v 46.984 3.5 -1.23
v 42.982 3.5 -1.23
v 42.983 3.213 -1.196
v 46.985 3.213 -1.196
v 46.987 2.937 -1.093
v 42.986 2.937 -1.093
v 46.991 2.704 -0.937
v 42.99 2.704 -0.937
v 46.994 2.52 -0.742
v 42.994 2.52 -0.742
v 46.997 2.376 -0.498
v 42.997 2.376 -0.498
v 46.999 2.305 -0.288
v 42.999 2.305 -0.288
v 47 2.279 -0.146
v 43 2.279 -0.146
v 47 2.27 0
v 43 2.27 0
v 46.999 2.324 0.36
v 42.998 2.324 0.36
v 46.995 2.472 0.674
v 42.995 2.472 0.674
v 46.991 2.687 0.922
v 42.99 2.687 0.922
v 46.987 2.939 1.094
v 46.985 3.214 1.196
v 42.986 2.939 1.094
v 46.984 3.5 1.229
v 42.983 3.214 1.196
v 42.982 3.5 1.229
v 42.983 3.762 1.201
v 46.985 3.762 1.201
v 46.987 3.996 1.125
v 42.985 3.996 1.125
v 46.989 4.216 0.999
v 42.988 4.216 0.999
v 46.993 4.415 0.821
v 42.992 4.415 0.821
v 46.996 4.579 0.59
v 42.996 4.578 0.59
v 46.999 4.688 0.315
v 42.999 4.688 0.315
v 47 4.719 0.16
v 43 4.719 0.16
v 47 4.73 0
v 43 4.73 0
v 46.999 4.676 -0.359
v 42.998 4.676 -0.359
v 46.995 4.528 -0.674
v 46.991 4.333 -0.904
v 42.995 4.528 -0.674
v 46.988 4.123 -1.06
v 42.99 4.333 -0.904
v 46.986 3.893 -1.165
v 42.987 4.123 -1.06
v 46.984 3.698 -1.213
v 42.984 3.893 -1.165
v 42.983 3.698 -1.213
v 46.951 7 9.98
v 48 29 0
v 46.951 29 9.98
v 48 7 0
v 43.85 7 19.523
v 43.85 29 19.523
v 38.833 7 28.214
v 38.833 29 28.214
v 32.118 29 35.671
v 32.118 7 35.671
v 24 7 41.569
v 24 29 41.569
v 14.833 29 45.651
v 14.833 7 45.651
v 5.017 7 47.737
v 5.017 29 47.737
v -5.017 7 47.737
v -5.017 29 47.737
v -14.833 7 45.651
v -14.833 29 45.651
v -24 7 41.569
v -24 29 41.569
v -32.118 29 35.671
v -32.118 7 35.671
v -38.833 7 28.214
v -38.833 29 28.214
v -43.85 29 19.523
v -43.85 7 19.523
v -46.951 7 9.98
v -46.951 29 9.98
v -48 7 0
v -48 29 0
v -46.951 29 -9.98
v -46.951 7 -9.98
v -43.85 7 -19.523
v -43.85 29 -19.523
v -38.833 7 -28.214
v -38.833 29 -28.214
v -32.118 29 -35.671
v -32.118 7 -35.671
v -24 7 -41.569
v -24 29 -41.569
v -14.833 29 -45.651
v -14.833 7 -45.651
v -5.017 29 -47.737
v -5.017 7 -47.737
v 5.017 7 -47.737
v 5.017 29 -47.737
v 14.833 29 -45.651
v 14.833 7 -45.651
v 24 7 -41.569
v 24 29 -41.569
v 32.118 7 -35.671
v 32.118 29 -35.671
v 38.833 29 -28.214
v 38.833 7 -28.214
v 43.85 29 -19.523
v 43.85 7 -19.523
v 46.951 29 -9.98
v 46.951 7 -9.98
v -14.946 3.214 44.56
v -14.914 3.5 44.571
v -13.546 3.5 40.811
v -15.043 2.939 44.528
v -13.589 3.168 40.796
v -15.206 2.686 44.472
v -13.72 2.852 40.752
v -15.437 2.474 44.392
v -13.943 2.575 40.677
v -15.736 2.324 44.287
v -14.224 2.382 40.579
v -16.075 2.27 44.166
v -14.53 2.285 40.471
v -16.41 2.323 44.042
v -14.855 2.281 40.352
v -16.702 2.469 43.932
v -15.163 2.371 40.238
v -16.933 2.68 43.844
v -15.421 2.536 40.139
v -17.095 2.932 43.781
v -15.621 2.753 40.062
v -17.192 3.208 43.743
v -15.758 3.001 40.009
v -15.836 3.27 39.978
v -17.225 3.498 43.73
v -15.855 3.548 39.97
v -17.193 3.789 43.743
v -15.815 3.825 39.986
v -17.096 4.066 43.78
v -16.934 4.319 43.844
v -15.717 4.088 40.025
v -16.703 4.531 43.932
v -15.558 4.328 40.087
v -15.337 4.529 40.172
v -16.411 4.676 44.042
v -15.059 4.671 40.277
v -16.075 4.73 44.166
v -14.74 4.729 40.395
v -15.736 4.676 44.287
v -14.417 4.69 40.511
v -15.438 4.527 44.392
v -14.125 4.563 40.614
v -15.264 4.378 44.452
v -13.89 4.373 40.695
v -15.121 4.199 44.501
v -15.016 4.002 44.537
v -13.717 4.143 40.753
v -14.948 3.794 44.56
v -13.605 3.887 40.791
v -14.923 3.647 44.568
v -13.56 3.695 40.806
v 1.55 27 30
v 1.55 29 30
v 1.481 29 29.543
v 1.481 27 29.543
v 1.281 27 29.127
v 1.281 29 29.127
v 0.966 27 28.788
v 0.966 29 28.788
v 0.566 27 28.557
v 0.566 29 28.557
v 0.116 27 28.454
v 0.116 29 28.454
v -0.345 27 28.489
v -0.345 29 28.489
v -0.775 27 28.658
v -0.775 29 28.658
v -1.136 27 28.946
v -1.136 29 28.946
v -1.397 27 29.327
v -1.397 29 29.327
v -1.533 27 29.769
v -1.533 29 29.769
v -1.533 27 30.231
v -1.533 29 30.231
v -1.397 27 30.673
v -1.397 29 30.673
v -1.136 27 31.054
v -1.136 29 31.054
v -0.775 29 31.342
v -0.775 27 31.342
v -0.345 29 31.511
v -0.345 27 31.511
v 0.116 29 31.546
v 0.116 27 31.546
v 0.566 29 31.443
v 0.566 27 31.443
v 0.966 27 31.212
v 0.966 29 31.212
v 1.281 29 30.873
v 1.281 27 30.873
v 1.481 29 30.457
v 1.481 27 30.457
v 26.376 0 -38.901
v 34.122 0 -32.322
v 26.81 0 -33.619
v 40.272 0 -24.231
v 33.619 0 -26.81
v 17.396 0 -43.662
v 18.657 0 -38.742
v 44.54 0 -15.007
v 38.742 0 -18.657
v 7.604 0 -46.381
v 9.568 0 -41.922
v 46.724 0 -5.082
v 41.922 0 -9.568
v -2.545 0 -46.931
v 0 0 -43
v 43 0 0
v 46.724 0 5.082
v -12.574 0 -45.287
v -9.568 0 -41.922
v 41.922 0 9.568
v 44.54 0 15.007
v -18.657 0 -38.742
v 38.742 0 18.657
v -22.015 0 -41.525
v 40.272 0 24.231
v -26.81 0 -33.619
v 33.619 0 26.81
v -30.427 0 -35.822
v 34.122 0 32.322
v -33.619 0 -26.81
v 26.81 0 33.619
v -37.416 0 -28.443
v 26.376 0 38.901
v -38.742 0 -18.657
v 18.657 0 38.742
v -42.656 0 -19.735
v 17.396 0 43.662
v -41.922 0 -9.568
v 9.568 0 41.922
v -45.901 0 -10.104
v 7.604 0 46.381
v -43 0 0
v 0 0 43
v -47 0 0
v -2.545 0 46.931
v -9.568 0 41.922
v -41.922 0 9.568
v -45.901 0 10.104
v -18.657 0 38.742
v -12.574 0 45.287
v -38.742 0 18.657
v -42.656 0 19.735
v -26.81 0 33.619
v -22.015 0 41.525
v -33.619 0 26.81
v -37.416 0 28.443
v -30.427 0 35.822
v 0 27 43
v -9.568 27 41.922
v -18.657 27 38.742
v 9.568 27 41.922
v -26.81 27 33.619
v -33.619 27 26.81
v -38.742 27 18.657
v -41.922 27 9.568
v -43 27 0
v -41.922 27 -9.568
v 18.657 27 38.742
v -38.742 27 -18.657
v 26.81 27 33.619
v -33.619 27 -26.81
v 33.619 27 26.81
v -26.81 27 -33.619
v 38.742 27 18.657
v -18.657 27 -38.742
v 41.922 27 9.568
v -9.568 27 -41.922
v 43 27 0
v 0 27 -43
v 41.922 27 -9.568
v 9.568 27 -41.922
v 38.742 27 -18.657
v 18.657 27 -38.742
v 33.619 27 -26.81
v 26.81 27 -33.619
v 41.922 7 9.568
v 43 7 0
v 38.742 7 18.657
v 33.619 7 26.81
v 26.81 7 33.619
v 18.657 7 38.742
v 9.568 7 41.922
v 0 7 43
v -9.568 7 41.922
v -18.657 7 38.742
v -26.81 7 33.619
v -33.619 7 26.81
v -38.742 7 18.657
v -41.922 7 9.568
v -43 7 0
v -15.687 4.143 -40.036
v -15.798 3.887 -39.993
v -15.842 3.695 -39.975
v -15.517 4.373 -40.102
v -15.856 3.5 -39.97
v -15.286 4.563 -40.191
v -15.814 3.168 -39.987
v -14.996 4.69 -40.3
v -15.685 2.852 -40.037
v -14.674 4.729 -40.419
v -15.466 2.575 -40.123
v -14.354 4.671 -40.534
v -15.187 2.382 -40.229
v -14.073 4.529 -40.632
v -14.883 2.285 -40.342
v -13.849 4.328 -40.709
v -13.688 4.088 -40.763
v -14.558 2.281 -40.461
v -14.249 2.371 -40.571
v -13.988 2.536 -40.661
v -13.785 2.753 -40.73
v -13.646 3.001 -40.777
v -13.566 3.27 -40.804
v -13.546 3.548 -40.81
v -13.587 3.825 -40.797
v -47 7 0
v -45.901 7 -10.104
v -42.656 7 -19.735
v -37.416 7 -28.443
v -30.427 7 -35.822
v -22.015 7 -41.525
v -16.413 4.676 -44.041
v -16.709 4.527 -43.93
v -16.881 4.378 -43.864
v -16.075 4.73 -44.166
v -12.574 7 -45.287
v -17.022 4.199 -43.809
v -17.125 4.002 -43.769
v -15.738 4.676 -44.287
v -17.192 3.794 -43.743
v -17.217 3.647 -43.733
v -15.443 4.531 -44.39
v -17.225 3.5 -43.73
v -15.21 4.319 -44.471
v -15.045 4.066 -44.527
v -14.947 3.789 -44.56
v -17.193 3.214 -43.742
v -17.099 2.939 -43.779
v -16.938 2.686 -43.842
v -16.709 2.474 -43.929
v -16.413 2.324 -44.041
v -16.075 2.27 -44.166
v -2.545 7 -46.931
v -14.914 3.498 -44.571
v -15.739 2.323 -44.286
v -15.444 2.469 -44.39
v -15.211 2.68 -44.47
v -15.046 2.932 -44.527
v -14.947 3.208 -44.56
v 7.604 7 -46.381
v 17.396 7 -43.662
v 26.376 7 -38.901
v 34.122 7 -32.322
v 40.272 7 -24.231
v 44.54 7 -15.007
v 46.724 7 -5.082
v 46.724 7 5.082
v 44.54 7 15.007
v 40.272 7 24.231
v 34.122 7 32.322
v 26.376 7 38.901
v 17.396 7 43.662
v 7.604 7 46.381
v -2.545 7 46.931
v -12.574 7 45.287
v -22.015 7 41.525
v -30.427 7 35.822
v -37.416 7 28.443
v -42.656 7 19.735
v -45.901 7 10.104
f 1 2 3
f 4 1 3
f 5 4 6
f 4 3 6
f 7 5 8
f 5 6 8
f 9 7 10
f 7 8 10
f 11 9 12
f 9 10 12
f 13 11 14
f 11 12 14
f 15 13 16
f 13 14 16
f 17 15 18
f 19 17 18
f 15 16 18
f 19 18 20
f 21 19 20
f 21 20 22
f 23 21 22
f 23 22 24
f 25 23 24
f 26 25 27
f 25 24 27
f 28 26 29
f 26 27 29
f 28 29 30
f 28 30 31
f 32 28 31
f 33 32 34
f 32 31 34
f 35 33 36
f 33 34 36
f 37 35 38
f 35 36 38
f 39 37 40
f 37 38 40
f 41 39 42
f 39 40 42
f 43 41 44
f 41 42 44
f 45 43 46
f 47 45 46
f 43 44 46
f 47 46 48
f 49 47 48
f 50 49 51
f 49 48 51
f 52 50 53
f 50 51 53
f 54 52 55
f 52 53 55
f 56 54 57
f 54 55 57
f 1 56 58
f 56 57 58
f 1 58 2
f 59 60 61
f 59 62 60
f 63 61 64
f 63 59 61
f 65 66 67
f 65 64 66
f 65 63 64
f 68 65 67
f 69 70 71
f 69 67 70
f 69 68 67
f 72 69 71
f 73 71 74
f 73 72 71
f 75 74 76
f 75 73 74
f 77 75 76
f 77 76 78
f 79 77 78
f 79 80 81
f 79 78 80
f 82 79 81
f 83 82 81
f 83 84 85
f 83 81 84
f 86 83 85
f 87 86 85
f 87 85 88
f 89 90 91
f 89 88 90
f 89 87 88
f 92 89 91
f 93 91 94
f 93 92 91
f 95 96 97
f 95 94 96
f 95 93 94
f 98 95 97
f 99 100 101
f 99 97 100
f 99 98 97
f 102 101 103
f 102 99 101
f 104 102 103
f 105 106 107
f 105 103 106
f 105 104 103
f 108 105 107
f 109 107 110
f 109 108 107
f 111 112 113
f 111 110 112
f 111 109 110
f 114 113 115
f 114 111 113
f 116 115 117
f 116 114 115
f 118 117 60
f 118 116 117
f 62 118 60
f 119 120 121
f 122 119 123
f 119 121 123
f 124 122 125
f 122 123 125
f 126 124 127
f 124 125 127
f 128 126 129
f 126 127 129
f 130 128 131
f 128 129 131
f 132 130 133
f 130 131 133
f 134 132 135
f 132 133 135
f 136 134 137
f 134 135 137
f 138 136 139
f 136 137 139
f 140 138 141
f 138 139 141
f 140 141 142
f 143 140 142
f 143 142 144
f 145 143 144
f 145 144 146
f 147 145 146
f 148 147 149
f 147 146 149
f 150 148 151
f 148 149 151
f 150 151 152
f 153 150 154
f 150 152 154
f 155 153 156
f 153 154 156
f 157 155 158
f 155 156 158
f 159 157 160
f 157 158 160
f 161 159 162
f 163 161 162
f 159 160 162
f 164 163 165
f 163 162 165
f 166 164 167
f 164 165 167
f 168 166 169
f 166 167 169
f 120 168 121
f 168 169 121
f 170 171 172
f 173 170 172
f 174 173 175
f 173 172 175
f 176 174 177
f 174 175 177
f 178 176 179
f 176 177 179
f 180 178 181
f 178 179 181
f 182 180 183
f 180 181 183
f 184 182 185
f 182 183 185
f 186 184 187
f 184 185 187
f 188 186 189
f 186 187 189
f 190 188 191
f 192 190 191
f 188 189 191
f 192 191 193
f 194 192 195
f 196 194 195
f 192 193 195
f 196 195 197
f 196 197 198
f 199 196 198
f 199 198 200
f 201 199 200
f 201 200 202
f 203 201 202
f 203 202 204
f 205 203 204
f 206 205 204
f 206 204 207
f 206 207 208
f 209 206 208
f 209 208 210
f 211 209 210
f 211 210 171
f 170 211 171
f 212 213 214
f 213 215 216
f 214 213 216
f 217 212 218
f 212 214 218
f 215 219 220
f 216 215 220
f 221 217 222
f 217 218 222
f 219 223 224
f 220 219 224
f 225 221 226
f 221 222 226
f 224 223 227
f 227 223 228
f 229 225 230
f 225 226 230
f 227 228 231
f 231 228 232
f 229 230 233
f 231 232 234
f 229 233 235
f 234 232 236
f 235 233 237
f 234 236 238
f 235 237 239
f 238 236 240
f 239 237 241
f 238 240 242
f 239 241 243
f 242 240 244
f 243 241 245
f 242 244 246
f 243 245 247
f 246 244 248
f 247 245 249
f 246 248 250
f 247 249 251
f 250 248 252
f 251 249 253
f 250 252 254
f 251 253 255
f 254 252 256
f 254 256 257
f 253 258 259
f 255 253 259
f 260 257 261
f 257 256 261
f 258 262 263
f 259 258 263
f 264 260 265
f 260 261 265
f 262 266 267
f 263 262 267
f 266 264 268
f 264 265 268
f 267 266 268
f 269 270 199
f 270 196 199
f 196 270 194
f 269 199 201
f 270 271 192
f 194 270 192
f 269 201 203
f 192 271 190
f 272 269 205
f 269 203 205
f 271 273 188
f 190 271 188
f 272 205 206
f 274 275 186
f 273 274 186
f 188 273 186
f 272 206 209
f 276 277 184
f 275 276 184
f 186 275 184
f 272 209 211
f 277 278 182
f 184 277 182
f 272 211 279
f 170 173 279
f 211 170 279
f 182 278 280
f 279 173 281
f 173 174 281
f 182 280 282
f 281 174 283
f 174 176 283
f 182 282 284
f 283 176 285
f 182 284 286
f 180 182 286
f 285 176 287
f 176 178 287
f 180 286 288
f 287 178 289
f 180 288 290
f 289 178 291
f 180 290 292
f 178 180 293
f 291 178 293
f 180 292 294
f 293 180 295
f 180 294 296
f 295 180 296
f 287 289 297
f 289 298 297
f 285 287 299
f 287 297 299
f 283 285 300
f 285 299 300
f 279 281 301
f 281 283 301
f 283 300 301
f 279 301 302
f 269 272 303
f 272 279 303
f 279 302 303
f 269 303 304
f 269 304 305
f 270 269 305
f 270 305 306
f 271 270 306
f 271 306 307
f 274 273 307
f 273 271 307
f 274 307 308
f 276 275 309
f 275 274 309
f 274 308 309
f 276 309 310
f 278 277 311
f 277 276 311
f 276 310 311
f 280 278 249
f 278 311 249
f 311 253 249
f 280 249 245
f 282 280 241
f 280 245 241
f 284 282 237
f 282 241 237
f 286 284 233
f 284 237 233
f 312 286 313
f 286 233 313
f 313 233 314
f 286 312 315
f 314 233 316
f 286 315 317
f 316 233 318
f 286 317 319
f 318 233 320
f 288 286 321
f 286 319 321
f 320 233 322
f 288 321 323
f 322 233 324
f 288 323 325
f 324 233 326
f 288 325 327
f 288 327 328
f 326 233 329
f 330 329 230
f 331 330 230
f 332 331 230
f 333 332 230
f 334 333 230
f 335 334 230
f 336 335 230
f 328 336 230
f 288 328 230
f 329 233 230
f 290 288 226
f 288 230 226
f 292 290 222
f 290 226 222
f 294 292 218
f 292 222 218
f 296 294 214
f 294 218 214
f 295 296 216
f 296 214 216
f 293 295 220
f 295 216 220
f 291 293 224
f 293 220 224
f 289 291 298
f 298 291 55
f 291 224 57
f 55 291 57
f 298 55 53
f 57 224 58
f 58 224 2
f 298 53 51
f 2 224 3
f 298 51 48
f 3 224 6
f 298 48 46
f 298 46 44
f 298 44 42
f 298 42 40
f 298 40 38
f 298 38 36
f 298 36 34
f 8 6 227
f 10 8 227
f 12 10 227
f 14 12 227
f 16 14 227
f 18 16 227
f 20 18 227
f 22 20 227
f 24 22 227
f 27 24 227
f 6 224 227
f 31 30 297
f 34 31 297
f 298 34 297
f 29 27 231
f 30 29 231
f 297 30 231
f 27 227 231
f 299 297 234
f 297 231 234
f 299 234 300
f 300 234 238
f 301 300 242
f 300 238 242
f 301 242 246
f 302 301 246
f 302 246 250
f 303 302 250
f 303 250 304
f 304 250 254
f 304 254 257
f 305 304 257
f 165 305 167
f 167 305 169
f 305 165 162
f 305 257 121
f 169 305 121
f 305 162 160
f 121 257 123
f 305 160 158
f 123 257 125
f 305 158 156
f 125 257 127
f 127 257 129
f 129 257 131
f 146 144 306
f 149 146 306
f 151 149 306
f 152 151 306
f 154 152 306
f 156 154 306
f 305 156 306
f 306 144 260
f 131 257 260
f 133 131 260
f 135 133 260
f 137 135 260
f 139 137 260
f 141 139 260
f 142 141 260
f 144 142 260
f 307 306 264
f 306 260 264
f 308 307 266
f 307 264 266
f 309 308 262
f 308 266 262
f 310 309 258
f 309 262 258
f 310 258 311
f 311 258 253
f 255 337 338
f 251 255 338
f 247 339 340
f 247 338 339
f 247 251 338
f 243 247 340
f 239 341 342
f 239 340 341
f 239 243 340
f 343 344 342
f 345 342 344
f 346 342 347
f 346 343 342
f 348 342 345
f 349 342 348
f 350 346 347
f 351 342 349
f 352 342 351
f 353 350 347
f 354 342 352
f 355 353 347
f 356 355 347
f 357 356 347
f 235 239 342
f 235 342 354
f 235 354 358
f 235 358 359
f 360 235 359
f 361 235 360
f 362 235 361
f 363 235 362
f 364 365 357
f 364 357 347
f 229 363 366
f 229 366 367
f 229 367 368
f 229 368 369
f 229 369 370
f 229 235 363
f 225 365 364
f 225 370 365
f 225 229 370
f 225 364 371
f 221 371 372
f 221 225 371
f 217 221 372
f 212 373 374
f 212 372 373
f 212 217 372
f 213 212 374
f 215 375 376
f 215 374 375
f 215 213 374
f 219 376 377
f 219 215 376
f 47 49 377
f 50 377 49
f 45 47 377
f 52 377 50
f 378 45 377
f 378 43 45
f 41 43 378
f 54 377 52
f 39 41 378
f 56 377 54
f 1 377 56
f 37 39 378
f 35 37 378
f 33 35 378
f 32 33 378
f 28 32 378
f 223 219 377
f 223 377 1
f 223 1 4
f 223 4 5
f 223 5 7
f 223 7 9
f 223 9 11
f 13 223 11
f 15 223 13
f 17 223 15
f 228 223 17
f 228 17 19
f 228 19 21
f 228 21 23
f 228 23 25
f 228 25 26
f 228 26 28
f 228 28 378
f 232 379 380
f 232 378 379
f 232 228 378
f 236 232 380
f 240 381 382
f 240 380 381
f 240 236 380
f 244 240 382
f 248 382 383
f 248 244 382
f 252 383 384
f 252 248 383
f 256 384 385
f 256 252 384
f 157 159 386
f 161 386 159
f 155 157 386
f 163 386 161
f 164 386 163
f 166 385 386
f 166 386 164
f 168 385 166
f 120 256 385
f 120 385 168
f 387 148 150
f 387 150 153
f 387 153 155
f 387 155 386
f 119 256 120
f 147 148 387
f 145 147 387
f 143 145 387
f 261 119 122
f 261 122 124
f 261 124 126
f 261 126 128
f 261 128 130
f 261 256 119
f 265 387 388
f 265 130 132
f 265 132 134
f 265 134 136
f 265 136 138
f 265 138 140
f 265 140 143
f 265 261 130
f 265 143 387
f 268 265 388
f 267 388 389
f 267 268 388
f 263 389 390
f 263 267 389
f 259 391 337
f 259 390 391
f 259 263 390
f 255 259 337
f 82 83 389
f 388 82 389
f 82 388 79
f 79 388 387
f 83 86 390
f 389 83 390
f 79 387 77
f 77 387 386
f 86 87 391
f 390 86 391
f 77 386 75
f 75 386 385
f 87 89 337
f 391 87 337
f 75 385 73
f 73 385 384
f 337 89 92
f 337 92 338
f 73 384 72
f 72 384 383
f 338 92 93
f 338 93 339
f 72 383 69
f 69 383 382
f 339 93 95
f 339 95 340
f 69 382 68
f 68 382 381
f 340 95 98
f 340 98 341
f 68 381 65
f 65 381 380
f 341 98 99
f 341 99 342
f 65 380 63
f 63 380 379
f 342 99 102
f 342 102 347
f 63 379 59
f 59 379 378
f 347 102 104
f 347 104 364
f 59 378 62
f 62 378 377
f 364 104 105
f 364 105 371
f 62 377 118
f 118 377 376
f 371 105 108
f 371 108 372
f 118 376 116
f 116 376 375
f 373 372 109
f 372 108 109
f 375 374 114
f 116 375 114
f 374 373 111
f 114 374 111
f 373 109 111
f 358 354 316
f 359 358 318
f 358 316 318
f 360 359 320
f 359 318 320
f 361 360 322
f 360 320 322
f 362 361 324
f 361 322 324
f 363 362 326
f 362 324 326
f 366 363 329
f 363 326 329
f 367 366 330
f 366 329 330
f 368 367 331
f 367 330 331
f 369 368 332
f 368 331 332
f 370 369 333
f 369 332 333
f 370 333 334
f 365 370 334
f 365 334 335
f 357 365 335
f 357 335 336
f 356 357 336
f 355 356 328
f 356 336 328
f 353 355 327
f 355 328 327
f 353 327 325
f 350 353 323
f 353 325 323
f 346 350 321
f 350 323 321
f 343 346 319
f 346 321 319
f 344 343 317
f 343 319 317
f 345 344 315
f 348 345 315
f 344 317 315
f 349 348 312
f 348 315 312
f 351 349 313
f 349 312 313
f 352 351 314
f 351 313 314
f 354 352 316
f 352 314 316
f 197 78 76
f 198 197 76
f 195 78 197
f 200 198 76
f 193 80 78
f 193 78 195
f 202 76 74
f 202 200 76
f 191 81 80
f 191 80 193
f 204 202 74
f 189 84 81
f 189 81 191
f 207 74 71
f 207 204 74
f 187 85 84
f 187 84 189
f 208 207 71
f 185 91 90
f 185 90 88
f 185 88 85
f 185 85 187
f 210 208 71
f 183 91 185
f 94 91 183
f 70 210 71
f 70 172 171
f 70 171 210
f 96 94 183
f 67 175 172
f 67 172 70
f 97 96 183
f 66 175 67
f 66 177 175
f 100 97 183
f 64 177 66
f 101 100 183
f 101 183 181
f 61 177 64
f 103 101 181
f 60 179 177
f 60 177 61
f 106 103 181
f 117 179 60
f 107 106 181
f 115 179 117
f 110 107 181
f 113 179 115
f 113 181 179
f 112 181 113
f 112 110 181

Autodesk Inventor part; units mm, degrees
ref_plane "XZ Plane" through (0, 0, 0) normal (0, 1, 0) x (-1, 0, 0)
ref_plane "XY Plane" through (0, 0, 0) normal (0, 0, 1) x (1, 0, 0)
sketch "Sketch1" plane through (0, 0, 0) normal (0, 1, 0) x (-1, 0, 0)
  circle A0 centre (0, 0) radius 47
  circle A1 centre (0, 0) radius 43
  dimension "d0" = 94
  dimension "d8" = 4
extrude "Extrusion1" add sketch "Sketch1" along normal blind 7
sketch "Sketch2" plane through (0, 7, 0) normal (0, 1, 0) x (1, 0, 0)
  circle A0 centre (0, 0) radius 43
  circle A1 centre (0, 0) radius 48
  dimension "d38" = 86
  dimension "d39" = 96
extrude "Extrusion2" add sketch "Sketch2" along normal blind 20
sketch "Sketch6" plane through (0, 27, 0) normal (0, 1, 0) x (1, 0, 0)
  circle A0 centre (0, 0) radius 48 projected
extrude "Extrusion5" add sketch "Sketch6" along normal blind 2
ref_plane "Work Plane2" through (47, 0, 0) normal (1, 0, 0) x (0, 1, 0)
sketch "Sketch7" plane through (47, 0, 0) normal (1, 0, 0) x (0, 1, 0)
  point P0 (0, 0)
  point P1 (3.5, 0)
hole "Hole1" at (47, 3.5, 0) direction (-1, 0, 0) diameter 2.459 depth 5 thread size "M3x0.5" class "6H" standard "ISO Metric profile"
pattern_circular "Circular Pattern6" count 3 over 220 about axis through (0, 0, 0) along (0, 1, 0) of "Hole1" both ways yes
sketch "Sketch8" plane through (0, 29, 0) normal (0, 1, 0) x (1, 0, 0)
  circle A0 centre (0, -30) radius 1.55
  point P0 (0, 0)
  dimension "d62" = 3.1
extrude "Extrusion6" cut sketch "Sketch8" against normal blind 2
properties part number "Abdeckung_Gaseinlass_new"
